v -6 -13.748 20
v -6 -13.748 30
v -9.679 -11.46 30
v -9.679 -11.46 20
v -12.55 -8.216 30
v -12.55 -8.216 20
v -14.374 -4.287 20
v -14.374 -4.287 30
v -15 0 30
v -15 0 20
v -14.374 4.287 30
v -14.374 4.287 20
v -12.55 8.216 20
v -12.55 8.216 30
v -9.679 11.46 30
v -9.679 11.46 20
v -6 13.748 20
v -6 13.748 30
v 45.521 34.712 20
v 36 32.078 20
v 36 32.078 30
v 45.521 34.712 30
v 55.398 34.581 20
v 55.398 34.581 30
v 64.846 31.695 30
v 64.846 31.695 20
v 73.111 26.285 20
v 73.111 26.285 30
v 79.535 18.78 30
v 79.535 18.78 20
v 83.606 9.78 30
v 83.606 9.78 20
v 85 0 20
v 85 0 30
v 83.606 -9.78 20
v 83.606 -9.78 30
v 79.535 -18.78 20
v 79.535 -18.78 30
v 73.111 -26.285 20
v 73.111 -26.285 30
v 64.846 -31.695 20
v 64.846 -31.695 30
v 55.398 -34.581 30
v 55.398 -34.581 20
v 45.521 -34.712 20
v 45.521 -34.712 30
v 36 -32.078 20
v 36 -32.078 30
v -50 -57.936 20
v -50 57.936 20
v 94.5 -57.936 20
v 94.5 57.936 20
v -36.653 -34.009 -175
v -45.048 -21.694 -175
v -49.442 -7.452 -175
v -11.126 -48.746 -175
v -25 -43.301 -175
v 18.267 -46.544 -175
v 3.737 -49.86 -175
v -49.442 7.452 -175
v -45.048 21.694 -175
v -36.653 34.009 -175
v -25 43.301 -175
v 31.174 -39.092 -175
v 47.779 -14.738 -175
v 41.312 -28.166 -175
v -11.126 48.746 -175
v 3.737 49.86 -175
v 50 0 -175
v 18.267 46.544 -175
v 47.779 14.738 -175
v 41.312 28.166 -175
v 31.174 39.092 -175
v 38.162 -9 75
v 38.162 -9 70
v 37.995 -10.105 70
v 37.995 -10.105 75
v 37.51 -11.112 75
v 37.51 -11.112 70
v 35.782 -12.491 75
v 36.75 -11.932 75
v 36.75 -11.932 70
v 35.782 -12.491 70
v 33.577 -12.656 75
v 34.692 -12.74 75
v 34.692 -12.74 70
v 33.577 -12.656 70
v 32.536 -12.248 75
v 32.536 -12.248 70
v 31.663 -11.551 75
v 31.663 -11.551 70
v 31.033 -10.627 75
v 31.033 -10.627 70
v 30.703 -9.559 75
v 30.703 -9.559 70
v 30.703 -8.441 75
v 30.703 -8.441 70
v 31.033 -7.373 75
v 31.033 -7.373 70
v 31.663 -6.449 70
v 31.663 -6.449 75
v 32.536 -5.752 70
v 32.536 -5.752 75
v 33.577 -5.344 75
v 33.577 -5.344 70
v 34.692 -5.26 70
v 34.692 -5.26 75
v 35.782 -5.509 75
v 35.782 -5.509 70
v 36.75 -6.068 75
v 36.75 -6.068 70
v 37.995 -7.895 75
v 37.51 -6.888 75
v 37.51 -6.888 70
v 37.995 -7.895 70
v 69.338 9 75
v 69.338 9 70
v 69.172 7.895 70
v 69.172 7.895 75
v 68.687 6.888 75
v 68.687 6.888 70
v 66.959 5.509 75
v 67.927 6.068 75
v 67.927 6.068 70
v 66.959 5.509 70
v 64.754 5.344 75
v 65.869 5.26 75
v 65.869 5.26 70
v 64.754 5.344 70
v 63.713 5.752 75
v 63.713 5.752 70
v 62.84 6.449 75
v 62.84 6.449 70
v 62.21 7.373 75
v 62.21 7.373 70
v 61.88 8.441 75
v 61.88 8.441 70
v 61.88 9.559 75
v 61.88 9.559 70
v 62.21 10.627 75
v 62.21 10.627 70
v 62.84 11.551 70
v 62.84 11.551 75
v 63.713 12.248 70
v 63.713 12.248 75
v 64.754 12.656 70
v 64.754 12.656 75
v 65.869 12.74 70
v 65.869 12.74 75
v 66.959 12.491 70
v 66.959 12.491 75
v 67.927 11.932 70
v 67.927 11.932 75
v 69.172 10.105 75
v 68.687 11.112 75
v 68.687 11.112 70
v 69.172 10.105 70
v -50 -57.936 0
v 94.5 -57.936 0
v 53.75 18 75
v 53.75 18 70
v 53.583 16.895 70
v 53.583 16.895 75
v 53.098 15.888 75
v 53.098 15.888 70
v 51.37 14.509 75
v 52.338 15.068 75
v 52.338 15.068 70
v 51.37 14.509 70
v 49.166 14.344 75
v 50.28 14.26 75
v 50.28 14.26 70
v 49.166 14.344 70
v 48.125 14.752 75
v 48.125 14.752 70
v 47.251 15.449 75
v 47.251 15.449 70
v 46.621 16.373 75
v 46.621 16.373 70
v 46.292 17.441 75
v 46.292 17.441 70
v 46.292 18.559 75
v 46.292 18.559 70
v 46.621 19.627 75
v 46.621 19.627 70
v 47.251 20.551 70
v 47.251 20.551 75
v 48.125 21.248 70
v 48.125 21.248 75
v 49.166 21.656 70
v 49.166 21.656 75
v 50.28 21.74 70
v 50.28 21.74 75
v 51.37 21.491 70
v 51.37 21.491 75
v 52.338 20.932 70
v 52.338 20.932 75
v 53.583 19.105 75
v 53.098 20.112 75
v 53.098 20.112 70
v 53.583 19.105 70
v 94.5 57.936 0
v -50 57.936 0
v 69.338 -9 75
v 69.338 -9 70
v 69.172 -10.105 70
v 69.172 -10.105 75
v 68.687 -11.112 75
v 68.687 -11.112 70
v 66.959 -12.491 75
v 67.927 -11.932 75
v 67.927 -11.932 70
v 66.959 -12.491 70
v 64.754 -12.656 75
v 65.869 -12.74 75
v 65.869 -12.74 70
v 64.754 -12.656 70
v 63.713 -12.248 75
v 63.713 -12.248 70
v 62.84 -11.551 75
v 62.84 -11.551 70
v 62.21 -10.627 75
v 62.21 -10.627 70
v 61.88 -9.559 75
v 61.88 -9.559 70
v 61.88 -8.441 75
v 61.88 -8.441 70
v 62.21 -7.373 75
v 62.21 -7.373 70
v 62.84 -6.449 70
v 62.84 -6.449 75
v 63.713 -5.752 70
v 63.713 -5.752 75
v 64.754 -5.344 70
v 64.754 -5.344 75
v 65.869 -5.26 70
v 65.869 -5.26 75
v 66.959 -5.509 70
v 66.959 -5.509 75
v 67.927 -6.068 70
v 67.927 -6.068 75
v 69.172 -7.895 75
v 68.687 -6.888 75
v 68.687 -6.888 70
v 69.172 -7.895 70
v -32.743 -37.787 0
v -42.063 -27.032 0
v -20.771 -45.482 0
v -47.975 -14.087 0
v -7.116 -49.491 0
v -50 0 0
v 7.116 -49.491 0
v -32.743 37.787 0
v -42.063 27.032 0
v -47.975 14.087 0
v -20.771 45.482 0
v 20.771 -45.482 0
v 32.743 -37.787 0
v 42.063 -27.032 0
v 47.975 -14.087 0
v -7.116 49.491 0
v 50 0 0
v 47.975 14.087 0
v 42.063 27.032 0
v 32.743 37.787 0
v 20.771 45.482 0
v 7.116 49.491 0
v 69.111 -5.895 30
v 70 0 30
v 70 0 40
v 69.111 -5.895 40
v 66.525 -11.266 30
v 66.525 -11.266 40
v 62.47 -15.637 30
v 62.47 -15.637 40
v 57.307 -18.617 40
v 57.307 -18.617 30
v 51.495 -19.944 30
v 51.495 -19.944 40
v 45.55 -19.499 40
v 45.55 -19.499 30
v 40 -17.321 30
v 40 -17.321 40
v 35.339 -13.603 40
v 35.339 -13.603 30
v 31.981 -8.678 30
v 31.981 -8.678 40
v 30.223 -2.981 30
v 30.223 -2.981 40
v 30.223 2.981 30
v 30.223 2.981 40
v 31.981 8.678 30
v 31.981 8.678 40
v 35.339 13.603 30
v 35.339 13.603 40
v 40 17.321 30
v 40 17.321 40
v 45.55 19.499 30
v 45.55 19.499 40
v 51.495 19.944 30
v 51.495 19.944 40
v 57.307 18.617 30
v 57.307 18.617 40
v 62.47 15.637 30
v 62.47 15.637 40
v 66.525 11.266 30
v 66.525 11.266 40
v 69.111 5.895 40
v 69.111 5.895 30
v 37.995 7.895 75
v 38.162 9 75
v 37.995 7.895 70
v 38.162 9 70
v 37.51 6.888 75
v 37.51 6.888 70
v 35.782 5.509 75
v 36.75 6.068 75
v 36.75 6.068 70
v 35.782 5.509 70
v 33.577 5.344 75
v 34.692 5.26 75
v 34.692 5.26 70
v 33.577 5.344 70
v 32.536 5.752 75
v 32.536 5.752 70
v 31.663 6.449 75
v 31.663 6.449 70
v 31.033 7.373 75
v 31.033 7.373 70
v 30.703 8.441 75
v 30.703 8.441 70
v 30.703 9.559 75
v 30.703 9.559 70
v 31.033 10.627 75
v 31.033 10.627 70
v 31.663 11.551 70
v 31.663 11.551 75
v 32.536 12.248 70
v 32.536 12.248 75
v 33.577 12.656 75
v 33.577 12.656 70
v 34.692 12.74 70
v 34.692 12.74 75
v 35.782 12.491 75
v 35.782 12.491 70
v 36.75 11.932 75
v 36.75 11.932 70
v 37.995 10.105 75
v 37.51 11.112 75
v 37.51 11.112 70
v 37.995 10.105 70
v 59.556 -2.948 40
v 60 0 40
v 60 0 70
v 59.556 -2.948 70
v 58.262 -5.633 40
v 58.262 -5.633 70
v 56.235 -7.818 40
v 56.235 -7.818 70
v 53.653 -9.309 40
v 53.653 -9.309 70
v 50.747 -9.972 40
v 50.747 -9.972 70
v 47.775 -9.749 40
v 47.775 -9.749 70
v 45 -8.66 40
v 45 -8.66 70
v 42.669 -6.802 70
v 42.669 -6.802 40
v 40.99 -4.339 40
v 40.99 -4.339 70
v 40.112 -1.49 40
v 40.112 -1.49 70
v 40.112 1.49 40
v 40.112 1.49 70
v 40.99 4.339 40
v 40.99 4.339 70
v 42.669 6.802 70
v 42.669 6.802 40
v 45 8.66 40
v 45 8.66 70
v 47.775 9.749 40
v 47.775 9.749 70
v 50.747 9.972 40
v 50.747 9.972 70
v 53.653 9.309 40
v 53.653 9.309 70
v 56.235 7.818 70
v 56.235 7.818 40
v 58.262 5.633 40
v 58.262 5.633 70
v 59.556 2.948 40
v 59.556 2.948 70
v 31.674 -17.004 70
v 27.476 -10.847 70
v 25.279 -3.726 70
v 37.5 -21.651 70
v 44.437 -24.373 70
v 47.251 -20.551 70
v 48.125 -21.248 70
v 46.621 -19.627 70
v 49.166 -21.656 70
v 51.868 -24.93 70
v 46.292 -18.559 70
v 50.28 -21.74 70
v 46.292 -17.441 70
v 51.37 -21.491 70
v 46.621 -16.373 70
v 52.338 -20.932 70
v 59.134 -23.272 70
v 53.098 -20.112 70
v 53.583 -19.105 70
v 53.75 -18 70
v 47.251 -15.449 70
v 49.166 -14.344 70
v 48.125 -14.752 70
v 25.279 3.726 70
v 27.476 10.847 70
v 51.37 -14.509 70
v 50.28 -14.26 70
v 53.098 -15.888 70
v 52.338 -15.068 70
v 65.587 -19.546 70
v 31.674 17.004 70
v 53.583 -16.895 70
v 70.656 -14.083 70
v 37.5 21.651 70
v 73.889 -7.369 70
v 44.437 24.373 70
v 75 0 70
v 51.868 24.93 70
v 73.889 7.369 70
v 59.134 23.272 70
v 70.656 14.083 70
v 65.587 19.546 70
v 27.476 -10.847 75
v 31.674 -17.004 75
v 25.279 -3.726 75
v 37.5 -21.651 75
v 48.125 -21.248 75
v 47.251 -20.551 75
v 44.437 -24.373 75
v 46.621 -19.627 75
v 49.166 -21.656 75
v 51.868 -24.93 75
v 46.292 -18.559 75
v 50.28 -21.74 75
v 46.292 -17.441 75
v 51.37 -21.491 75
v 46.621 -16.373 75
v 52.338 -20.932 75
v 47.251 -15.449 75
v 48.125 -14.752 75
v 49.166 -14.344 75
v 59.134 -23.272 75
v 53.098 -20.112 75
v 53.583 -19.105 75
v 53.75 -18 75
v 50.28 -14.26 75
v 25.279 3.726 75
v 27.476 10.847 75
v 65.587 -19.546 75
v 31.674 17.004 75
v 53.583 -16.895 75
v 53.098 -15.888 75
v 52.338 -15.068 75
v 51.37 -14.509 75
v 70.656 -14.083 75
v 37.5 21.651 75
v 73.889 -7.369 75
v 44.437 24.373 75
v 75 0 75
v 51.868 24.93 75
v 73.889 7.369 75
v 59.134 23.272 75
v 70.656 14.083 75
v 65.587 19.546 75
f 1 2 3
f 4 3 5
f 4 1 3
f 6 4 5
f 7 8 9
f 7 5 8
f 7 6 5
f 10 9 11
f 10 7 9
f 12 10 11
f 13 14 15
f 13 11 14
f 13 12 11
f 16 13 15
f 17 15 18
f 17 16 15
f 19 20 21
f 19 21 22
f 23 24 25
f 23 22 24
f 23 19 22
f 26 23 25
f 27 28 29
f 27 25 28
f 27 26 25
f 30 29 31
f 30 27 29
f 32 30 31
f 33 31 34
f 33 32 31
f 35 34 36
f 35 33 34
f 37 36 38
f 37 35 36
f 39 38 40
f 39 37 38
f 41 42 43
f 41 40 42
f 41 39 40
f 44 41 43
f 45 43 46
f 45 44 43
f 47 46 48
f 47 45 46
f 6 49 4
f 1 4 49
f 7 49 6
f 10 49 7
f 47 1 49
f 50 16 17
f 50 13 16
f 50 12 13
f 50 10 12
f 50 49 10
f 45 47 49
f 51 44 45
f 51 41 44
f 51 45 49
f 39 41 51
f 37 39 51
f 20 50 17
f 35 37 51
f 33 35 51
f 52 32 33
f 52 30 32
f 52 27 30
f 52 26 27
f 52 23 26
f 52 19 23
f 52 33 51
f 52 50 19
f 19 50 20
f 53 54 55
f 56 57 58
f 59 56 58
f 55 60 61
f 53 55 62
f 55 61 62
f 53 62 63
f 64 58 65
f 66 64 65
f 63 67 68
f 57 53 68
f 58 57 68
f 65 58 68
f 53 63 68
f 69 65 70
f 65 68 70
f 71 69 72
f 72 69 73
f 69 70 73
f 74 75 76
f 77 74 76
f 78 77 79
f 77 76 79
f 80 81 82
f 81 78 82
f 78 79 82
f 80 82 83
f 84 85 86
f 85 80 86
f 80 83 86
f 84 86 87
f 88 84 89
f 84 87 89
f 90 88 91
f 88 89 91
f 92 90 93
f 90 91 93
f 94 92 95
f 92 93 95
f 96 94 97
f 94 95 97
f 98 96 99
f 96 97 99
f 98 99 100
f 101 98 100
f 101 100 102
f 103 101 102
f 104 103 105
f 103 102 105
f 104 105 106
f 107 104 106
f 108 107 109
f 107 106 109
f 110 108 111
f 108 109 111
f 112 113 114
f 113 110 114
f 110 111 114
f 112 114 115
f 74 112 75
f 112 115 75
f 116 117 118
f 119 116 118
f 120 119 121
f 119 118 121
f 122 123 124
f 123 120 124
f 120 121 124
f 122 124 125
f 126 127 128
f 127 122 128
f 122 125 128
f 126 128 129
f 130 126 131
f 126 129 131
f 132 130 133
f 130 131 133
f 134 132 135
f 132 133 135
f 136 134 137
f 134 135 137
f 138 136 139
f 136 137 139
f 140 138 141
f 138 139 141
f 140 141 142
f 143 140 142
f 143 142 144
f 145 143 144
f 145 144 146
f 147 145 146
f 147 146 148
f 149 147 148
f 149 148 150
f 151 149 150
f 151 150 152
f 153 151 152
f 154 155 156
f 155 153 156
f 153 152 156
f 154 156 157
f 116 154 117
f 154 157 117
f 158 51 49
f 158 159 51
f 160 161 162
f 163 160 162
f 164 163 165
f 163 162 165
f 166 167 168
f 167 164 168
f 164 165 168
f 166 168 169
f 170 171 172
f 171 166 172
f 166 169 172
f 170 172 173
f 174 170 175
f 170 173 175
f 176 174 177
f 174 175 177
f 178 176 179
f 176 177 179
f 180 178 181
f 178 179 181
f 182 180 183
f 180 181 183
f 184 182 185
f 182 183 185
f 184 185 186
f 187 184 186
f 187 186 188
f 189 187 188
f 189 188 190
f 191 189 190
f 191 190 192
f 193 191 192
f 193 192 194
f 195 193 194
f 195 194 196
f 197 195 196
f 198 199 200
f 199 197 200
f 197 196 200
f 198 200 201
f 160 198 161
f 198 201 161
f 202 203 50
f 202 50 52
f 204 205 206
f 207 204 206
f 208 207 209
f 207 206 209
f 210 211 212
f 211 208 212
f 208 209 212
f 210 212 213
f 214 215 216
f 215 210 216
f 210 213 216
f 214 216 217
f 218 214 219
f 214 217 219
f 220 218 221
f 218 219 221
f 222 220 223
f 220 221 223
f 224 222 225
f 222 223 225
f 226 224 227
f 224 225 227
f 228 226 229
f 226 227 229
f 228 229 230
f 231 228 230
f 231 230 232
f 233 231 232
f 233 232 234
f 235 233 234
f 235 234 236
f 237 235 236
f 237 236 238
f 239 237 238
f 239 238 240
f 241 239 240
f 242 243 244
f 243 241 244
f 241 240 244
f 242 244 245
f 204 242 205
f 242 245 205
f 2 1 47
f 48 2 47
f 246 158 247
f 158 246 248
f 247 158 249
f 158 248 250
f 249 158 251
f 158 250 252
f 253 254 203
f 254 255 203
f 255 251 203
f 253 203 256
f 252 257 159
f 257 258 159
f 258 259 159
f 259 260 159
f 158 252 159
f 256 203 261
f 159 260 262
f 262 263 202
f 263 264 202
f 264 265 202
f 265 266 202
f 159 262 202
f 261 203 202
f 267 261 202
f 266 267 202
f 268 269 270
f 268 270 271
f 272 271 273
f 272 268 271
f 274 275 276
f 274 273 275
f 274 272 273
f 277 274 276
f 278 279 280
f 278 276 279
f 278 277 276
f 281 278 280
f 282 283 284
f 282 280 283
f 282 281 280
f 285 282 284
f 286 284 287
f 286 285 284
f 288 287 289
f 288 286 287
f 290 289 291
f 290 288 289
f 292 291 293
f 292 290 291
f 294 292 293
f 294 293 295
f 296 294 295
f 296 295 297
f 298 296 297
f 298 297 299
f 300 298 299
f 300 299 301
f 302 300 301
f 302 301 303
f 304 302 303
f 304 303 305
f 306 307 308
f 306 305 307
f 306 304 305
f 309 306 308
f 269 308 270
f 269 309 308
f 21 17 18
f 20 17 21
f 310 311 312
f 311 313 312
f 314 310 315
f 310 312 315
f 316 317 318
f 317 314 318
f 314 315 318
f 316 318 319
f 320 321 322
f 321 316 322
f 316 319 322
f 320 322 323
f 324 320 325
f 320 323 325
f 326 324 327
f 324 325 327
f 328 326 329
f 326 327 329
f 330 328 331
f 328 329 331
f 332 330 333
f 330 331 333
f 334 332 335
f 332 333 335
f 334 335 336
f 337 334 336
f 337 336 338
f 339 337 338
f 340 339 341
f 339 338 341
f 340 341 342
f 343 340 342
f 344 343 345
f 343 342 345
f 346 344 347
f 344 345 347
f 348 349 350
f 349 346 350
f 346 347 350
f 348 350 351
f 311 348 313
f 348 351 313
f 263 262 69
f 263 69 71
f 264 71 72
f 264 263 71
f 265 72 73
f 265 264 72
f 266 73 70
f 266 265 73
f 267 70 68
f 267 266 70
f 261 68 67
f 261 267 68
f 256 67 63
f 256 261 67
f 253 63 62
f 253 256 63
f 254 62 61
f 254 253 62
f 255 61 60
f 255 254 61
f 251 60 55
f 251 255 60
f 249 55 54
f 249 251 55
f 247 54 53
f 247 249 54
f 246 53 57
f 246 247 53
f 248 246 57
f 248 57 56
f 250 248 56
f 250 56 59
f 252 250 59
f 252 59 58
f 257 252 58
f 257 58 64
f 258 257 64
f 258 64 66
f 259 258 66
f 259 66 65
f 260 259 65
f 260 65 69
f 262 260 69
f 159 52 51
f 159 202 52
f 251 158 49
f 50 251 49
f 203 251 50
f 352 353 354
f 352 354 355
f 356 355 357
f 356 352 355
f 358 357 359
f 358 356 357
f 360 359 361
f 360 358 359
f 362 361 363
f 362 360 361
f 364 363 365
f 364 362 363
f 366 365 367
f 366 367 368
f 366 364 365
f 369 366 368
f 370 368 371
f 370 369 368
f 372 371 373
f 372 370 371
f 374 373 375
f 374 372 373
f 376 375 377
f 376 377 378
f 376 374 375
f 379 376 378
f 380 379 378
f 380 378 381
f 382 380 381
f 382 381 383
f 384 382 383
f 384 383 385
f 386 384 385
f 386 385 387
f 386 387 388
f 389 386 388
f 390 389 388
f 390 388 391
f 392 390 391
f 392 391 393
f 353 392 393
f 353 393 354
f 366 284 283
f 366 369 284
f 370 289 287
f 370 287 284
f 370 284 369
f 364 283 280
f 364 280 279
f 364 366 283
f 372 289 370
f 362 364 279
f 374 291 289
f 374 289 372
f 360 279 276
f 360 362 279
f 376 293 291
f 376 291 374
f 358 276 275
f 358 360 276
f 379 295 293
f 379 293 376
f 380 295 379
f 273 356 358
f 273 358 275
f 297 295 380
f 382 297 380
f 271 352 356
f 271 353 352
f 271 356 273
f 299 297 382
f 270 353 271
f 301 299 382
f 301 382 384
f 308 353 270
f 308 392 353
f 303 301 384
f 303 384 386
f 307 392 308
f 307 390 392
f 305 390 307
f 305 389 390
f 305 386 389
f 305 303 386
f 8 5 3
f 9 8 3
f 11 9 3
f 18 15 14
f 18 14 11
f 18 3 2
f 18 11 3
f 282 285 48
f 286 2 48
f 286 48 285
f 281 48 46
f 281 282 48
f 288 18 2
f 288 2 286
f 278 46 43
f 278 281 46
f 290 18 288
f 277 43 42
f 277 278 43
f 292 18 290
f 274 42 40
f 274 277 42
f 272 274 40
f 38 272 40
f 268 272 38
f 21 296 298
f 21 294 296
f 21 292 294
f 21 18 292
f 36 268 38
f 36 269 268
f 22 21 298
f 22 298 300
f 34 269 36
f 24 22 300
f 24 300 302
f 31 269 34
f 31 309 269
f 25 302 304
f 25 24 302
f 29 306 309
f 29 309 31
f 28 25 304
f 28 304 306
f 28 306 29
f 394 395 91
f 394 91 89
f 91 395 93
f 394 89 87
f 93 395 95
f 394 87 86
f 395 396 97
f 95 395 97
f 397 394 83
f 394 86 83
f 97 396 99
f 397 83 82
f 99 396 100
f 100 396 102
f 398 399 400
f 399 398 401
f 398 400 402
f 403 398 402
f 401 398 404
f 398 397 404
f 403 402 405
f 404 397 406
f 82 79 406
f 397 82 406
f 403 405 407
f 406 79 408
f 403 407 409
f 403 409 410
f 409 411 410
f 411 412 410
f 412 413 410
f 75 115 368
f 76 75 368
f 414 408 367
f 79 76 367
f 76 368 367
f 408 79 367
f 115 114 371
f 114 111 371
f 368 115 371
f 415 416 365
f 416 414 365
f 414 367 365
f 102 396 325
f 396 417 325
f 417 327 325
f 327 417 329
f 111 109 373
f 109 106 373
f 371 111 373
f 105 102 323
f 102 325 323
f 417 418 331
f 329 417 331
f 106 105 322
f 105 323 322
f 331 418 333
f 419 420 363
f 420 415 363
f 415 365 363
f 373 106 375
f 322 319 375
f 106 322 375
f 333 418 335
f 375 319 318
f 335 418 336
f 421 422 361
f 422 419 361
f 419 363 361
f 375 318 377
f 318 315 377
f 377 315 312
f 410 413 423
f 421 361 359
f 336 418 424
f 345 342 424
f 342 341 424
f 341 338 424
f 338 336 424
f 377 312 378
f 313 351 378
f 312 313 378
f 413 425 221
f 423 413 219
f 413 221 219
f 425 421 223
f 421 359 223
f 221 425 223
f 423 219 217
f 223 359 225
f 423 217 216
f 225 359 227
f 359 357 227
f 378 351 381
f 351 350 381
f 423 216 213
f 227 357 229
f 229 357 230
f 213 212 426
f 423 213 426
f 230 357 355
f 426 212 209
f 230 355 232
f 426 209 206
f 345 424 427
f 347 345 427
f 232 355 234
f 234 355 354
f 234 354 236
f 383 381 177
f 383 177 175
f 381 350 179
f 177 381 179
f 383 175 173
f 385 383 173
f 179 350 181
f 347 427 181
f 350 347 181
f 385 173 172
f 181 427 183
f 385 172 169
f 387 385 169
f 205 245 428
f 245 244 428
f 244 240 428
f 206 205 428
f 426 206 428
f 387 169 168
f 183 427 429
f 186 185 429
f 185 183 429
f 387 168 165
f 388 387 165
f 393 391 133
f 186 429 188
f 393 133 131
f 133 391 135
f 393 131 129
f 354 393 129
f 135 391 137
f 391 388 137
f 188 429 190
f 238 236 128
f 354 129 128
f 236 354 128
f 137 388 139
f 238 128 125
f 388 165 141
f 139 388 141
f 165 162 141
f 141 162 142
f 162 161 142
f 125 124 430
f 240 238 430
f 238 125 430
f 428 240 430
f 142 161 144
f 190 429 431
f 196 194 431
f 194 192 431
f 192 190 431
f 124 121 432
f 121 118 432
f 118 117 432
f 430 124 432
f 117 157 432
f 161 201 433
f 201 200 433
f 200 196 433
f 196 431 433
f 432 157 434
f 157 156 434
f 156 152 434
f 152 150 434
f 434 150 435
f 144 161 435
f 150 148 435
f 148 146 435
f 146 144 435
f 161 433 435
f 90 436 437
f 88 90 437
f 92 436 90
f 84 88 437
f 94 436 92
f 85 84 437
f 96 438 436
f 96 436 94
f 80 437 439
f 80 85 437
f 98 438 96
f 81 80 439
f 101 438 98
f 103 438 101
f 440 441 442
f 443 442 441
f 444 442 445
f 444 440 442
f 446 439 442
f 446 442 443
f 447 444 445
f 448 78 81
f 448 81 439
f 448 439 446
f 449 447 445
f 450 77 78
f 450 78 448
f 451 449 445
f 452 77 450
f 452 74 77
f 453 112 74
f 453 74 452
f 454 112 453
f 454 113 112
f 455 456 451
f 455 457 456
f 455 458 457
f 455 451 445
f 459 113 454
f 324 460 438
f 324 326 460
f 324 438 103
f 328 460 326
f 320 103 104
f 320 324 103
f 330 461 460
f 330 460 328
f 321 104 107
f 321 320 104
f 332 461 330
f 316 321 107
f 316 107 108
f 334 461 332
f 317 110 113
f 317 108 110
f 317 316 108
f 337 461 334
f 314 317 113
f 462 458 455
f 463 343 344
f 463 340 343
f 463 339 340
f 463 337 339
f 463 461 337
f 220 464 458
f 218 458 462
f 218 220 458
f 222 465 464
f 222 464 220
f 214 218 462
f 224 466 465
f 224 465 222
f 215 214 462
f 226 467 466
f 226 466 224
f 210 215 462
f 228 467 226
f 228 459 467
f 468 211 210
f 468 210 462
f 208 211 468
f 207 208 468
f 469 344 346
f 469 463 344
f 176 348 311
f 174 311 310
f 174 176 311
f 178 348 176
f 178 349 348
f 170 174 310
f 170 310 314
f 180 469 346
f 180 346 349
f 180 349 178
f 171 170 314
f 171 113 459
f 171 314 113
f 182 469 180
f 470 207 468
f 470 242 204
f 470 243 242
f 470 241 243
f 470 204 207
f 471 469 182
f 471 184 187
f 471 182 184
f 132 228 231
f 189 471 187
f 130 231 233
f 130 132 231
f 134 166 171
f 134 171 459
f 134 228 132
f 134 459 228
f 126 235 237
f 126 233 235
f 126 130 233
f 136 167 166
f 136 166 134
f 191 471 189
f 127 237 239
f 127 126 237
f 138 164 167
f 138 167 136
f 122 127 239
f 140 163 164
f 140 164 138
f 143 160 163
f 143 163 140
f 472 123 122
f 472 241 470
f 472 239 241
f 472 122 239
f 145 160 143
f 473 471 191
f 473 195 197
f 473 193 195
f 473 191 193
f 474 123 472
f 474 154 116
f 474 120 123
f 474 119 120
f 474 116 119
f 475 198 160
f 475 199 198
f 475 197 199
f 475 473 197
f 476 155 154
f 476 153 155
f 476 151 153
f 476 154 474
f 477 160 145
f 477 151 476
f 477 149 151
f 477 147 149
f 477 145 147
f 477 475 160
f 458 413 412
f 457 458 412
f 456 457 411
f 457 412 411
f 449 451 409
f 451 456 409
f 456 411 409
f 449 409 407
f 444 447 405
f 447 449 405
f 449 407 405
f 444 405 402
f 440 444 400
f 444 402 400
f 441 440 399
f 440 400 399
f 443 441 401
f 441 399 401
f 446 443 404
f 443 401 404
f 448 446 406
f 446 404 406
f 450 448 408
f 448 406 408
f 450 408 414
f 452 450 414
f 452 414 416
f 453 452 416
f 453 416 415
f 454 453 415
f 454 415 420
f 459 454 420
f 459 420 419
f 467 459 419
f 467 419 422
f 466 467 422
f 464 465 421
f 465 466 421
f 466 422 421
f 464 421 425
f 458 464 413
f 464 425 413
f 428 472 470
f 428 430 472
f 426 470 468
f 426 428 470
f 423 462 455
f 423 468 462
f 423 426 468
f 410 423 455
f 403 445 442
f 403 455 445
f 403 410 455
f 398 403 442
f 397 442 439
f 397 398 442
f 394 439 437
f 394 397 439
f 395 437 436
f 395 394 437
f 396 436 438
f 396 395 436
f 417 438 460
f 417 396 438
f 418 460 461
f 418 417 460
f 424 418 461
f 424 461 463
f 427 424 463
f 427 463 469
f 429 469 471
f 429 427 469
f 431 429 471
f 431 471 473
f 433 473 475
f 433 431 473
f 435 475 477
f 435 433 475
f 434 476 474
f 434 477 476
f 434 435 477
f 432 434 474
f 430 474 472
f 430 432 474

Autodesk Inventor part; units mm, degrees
ref_plane "YZ Plane" through (0, 0, 0) normal (1, 0, 0) x (0, 1, 0)
ref_plane "XZ Plane" through (0, 0, 0) normal (0, 1, 0) x (-1, 0, 0)
ref_plane "XY Plane" through (0, 0, 0) normal (0, 0, 1) x (1, 0, 0)
sketch "Sketch1" plane through (0, 0, 0) normal (0, 0, 1) x (1, 0, 0)
  circle A0 centre (0, 0) radius 50
  dimension "d0" = 100
extrude "Extrusion1" add sketch "Sketch1" against normal blind 175
sketch "Sketch2" plane through (0, 0, 0) normal (0, 0, 1) x (1, 0, 0)
  line L0 (94.5, 57.9363) -> (94.5, -57.9363)
  line L1 (94.5, -57.9363) -> (-50, -57.9363)
  line L2 (-50, -57.9363) -> (-50, 57.9363)
  line L3 (-50, 57.9363) -> (94.5, 57.9363)
  circle A0 centre (0, 0) radius 50 projected
  point P0 (94.5, 0)
  dimension "d3" = 144.5
  dimension "d4" = 115.8726
extrude "Extrusion2" add sketch "Sketch2" along normal blind 20 contours A0 | L0 L1 L2 L3
sketch "Sketch3" plane through (0, 0, 20) normal (0, 0, 1) x (1, 0, 0)
  arc A0 (-6, 13.7477) -> (-6, -13.7477) centre (0, 0) ccw
  arc A1 (36, -32.078) -> (36, 32.078) centre (50, 0) ccw
  line L0 (-6, 13.7477) -> (36, 32.078)
  line L1 (-6, -13.7477) -> (36, -32.078)
  dimension "d8" = 30
  dimension "d9" = 70
extrude "Extrusion3" add sketch "Sketch3" along normal blind 10
sketch "Sketch4" plane through (0, 0, 30) normal (0, 0, 1) x (1, 0, 0)
  arc A0 (36, -32.078) -> (36, 32.078) centre (50, 0) ccw projected
  circle A1 centre (50, 0) radius 20
  point P0 (0, 0)
  dimension "d12" = 40
extrude "Extrusion4" add sketch "Sketch4" along normal blind 10
sketch "Sketch5" plane through (50, 0, 40) normal (0, 0, 1) x (1, 0, 0)
  circle A0 centre (-50, 0) radius 50 projected
  circle A1 centre (0, 0) radius 10
  point P0 (-100, 0)
  dimension "d15" = 20
extrude "Extrusion5" add sketch "Sketch5" along normal blind 30 contours A0 A1 | A0 A1 picked at (-3.2709, -1.921) picked at (2.9235, -2.6438)
sketch "Sketch6" plane through (50, 0, 70) normal (0, 0, 1) x (1, 0, 0)
  circle A0 centre (0, 0) radius 25
  circle A1 centre (0, 18) radius 3.75
  circle A2 centre (-15.5885, 9) radius 3.75
  circle A3 centre (-15.5885, -9) radius 3.75
  circle A4 centre (0, -18) radius 3.75
  circle A5 centre (15.5885, -9) radius 3.75
  circle A6 centre (15.5885, 9) radius 3.75
  point P0 (-50, 0)
  dimension "d18" = 50
  dimension "d19" = 7.5
  dimension "d20" = 18
  dimension "d23" = 360
extrude "Extrusion6" add sketch "Sketch6" along normal blind 5
properties part number "drivemotors"
